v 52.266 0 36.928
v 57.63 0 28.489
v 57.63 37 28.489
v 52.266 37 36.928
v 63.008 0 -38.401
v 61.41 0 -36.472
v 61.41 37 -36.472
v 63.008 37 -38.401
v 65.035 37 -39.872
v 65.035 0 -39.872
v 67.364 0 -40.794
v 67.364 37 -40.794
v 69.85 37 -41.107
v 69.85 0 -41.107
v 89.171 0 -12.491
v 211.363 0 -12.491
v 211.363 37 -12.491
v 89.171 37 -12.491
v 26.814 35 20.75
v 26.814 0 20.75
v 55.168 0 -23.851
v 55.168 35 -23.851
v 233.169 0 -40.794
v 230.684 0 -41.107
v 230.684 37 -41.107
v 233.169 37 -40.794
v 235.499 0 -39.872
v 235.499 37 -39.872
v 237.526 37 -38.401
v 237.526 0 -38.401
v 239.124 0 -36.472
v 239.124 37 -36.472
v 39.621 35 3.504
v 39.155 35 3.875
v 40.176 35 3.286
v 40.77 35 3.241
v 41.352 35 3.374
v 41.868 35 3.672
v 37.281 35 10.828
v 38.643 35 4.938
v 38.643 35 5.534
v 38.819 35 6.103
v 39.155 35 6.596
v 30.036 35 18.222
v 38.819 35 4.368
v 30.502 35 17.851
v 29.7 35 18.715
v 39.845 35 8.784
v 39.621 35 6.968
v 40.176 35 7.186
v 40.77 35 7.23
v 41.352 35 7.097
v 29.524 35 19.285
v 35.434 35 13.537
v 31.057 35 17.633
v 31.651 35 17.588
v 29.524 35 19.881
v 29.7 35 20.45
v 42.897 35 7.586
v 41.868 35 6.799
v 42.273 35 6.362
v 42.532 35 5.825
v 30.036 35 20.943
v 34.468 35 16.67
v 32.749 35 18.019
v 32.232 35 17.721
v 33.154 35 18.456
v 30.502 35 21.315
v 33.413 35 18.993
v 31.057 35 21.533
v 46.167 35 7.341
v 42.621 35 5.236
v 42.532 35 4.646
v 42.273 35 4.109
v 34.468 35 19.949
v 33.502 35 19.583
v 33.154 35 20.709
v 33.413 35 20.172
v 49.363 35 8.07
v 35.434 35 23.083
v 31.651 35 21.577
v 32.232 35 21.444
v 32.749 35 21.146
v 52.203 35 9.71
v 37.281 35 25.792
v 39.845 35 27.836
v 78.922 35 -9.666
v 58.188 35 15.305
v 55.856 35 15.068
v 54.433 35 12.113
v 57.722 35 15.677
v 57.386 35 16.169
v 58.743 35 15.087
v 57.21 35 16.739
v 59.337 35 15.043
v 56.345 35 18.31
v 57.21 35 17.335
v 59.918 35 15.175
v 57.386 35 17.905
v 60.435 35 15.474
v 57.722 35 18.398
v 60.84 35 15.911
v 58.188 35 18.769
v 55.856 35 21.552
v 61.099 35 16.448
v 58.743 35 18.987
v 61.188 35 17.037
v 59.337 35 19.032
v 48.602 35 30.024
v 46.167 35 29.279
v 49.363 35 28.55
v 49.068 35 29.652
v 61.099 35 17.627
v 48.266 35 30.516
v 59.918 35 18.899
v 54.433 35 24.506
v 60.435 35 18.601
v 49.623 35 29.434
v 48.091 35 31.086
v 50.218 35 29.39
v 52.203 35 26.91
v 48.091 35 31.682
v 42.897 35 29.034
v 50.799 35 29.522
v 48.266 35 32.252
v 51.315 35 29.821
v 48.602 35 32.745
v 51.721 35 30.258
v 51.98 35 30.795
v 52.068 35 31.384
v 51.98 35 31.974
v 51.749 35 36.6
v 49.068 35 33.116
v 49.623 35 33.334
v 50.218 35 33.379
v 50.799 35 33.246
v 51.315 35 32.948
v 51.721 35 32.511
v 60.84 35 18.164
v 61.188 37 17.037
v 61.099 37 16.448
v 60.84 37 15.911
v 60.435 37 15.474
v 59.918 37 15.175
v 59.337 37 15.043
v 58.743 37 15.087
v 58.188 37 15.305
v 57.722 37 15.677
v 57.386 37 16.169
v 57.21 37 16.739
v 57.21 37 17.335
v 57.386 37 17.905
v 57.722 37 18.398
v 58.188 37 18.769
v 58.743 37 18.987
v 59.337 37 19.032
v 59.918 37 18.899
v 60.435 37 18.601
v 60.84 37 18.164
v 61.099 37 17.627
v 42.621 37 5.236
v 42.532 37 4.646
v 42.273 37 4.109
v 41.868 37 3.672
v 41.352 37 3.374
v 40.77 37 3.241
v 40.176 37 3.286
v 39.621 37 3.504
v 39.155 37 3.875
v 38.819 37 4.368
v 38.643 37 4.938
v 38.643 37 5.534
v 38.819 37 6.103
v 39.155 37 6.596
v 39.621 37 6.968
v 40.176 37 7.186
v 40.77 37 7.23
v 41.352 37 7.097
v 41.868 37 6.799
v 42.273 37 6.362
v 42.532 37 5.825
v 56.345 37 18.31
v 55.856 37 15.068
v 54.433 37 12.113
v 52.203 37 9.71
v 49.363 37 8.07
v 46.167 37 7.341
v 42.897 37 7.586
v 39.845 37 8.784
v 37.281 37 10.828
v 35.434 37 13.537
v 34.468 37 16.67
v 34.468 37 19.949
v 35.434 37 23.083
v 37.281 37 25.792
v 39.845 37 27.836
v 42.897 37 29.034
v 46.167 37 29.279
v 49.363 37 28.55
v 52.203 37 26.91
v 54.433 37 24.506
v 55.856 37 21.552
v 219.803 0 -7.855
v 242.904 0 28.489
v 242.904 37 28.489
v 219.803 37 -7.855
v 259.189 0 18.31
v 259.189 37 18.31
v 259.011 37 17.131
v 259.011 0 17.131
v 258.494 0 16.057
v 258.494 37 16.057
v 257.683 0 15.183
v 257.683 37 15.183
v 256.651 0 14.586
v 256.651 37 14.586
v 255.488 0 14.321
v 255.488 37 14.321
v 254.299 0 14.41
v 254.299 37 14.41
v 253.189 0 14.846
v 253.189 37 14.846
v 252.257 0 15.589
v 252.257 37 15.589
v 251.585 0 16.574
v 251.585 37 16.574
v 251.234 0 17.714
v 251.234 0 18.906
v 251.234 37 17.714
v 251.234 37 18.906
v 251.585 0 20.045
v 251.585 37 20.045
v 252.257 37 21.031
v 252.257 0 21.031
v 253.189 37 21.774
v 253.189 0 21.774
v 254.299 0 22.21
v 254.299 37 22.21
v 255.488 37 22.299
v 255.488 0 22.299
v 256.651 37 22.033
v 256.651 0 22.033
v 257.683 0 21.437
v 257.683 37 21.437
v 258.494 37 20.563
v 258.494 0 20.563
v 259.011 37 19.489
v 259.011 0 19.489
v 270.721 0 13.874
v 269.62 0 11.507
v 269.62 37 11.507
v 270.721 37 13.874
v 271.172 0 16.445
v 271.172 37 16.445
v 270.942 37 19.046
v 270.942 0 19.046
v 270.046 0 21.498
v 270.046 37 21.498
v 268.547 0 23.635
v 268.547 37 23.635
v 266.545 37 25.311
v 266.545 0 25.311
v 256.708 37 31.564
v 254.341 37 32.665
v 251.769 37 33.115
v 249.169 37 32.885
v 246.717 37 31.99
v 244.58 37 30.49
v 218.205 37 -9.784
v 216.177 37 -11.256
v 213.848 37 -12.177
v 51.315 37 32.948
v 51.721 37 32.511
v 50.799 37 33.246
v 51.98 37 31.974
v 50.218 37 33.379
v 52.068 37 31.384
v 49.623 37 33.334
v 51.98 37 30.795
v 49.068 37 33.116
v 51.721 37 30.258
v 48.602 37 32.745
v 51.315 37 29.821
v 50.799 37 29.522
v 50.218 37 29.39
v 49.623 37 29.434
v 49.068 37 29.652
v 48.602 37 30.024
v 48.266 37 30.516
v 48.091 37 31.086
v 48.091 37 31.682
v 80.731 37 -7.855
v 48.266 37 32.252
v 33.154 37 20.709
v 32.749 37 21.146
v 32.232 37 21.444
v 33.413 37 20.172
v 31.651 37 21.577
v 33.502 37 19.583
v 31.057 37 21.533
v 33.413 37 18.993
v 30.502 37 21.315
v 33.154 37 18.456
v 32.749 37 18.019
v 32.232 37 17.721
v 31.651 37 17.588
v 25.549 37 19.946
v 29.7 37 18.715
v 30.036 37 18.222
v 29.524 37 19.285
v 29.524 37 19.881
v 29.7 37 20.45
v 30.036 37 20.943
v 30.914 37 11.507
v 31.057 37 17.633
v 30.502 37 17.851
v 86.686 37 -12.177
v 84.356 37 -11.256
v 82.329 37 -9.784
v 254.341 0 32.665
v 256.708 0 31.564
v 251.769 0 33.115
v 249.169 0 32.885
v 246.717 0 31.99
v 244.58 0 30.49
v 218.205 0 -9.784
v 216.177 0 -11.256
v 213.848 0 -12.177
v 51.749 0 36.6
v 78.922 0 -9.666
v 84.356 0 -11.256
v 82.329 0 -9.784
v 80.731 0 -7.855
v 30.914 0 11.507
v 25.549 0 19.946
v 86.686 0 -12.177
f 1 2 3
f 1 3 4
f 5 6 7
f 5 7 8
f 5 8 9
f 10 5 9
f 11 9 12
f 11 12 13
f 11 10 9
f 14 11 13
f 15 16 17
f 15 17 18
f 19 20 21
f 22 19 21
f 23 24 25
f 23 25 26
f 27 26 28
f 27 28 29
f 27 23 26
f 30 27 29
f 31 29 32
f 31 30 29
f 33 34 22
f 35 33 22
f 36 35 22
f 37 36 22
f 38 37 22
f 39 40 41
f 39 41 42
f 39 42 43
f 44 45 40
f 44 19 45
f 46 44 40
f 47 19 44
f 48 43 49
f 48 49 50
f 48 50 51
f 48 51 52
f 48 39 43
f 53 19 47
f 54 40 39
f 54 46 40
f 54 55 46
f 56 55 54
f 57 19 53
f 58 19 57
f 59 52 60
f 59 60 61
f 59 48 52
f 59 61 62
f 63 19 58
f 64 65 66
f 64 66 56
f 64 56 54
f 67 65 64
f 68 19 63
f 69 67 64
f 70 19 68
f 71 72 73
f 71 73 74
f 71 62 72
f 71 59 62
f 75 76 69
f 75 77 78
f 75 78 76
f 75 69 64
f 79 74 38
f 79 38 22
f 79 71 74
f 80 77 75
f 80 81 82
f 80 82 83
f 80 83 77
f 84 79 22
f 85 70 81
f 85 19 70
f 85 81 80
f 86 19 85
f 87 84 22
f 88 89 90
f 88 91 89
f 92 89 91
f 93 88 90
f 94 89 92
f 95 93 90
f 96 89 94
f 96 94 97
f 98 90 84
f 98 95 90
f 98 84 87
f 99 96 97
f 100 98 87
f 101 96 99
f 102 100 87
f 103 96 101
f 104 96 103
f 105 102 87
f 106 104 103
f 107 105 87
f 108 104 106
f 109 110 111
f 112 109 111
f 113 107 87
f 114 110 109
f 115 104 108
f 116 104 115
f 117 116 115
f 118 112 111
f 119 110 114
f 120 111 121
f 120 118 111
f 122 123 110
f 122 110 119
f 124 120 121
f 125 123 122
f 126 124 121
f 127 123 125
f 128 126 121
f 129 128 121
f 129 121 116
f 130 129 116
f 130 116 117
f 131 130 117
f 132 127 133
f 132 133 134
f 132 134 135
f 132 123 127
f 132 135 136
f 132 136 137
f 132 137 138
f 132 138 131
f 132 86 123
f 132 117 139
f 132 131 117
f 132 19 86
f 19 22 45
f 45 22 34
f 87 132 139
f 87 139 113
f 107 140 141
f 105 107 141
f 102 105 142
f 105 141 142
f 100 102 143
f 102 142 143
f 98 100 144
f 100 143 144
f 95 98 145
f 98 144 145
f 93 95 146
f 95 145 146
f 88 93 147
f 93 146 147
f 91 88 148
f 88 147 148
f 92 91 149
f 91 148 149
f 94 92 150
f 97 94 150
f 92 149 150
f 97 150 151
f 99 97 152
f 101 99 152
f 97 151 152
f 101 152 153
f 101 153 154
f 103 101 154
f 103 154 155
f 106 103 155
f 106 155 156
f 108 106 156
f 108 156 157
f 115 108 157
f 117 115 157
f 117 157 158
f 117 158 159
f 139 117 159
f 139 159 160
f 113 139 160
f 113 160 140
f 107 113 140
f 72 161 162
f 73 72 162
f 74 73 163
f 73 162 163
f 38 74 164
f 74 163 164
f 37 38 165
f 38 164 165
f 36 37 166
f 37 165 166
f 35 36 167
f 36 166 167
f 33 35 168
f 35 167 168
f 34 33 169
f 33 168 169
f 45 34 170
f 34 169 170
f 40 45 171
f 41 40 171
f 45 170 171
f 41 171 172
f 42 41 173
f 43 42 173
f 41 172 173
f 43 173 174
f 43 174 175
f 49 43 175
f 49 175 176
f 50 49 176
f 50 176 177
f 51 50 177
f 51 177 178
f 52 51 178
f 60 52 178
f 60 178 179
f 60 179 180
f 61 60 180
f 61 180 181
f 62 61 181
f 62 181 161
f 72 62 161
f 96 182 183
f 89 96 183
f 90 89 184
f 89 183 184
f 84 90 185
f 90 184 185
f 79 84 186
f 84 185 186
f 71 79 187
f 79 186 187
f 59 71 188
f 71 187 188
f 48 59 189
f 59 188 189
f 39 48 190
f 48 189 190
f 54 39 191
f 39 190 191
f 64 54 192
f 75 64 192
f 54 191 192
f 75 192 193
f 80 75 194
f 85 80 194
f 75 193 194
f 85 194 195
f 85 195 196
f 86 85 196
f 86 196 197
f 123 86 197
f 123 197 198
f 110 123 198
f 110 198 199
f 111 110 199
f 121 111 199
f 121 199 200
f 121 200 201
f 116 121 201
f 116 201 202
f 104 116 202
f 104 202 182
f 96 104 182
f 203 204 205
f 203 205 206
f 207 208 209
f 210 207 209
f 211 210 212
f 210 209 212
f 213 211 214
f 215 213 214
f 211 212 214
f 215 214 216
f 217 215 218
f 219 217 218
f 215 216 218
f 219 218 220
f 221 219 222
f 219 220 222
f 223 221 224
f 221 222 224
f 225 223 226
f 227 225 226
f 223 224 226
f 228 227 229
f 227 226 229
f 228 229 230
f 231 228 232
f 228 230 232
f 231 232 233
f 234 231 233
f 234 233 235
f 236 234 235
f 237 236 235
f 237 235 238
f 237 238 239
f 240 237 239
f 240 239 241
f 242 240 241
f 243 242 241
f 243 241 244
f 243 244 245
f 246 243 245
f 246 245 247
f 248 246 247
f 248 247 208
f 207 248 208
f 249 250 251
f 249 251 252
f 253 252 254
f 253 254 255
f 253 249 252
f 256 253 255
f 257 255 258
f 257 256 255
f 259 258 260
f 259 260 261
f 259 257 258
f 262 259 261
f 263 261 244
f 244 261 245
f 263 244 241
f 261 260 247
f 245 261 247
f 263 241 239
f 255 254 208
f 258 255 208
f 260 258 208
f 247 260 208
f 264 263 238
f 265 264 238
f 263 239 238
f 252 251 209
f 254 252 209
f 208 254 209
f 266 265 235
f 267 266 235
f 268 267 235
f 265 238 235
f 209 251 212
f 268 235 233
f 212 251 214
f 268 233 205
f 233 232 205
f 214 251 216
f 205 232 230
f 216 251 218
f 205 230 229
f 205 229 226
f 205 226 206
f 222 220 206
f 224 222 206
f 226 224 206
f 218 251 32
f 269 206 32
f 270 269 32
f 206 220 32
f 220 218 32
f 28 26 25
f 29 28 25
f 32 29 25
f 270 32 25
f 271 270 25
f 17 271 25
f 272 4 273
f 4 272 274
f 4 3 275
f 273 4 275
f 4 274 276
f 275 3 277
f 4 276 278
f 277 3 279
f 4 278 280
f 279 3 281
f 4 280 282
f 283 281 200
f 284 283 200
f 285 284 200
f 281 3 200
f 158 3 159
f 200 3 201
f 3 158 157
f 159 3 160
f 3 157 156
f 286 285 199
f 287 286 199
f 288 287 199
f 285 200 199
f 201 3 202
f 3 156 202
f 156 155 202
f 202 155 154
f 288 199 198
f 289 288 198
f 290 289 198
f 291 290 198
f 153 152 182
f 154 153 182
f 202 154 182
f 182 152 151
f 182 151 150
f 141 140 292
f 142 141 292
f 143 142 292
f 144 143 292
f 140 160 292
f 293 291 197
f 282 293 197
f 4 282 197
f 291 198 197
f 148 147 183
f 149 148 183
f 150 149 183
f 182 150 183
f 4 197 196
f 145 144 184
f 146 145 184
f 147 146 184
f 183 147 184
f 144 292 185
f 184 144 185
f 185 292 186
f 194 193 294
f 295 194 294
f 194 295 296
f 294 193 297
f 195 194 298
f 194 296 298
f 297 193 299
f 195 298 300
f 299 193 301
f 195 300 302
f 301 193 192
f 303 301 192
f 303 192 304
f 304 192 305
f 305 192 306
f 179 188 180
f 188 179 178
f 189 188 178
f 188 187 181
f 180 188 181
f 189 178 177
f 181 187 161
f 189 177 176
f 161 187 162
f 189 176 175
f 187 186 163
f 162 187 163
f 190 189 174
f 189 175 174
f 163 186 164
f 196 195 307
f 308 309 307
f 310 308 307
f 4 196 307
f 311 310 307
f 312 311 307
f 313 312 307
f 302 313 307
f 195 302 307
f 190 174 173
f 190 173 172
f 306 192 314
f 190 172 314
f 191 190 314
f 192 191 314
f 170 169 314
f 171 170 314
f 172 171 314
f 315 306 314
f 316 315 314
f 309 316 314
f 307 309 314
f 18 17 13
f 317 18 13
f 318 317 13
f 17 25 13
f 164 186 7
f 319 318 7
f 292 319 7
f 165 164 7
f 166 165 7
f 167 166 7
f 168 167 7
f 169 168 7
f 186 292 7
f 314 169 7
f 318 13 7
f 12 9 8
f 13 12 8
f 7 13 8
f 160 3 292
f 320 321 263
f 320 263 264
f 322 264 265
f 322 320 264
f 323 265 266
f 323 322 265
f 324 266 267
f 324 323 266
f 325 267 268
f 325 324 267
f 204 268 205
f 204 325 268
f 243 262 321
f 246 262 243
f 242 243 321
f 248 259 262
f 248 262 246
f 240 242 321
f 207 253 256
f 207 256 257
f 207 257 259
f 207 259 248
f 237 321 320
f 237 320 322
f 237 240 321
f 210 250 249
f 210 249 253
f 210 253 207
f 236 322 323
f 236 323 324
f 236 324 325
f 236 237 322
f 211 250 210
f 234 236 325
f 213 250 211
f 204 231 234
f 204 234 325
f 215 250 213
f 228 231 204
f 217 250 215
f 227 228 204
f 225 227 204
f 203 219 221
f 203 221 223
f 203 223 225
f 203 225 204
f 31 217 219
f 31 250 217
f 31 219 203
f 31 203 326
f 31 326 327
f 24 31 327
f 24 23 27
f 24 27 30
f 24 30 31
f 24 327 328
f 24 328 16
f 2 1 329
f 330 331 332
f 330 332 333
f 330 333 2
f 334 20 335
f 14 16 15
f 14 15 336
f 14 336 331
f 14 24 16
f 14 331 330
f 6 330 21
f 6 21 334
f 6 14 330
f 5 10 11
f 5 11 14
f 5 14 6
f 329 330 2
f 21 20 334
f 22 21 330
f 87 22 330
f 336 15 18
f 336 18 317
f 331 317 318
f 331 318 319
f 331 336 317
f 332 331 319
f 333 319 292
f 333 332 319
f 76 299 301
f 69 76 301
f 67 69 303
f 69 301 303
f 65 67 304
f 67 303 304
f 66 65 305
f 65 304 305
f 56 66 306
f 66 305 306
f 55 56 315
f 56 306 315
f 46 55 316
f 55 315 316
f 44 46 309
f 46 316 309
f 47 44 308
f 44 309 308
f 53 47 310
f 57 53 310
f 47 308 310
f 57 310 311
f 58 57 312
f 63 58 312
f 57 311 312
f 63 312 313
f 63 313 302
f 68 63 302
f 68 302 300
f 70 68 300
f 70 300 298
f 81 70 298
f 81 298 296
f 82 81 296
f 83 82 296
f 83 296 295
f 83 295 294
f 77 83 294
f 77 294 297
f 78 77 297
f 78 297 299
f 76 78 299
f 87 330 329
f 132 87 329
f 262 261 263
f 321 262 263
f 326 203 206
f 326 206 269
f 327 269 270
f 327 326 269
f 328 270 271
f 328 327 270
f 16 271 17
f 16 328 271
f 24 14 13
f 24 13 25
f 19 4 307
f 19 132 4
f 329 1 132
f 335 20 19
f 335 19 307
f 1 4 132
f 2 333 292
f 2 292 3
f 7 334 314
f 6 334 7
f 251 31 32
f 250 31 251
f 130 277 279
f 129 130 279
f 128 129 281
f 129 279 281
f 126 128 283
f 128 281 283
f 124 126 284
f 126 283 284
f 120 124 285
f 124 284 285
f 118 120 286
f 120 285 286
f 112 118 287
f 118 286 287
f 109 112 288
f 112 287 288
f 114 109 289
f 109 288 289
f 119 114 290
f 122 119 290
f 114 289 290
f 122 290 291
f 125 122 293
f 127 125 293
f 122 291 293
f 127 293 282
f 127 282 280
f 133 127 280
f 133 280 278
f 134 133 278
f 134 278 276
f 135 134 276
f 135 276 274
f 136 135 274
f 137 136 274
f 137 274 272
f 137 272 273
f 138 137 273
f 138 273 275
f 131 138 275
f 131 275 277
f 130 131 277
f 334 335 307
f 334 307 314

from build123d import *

# Parameters (mm, degrees)
BOSS_EXTRUDE1_DEPTH = 37
SKETCH3_R           = 11
SKETCH3_R_2         = 2
SKETCH3_R_3         = 4
CUT_EXTRUDE1_DEPTH  = 92
CUT_EXTRUDE5_DEPTH  = 35


with BuildPart() as part:
    # Sketch1 → Boss-Extrude1 (new body)
    with BuildSketch(Plane(origin=(0, 0, 0), x_dir=(1, 0, 0), z_dir=(0, 1, 0))):
        with BuildLine():
            Line((30.91362152, -11.506988518), (61.410209359, 36.471719739))
            ThreePointArc((61.410209359, 36.471719739), (65.035248289, 39.872184028), (69.84963689, 41.10738726))
            Line((69.84963689, 41.10738726), (230.684249594, 41.10738726))
            ThreePointArc((230.684249594, 41.10738726), (235.498638195, 39.872184028), (239.123677125, 36.471719739))
            Line((239.123677125, 36.471719739), (269.620264964, -11.506988518))
            ThreePointArc((269.620264964, -11.506988518), (270.941569742, -19.045741561), (266.545169913, -25.310748528))
            Line((266.545169913, -25.310748528), (256.707586966, -31.563787081))
            ThreePointArc((256.707586966, -31.563787081), (249.168833923, -32.885091859), (242.903826956, -28.488692029))
            Line((242.903826956, -28.488692029), (219.802518103, 7.855405338))
            ThreePointArc((219.802518103, 7.855405338), (216.177479173, 11.255869627), (211.363090572, 12.491072858))
            Line((211.363090572, 12.491072858), (89.170795912, 12.491072858))
            ThreePointArc((89.170795912, 12.491072858), (84.356407311, 11.255869627), (80.731368381, 7.855405338))
            Line((80.731368381, 7.855405338), (57.630059528, -28.488692029))
            Line((57.630059528, -28.488692029), (52.265727049, -36.92811956))
            Line((52.265727049, -36.92811956), (25.54928904, -19.946416049))
            Line((25.54928904, -19.946416049), (30.91362152, -11.506988518))
        make_face()
    extrude(amount=BOSS_EXTRUDE1_DEPTH)

    # Sketch3 → Cut-Extrude1 (cut)
    with BuildSketch(Plane(origin=(0, 37, 0), x_dir=(1, 0, 0), z_dir=(0, 1, 0))):
        with Locations((45.34470702, -18.309954767)):
            Circle(SKETCH3_R)
        with Locations((40.621019343, -5.235675639)):
            Circle(SKETCH3_R_2)
        with Locations((59.187759911, -17.037207093)):
            Circle(SKETCH3_R_2)
        with Locations((255.189179464, -18.309954767)):
            Circle(SKETCH3_R_3)
        with Locations((50.068394696, -31.384233896)):
            Circle(SKETCH3_R_2)
        with Locations((31.501654128, -19.582702442)):
            Circle(SKETCH3_R_2)
    extrude(amount=-CUT_EXTRUDE1_DEPTH, mode=Mode.SUBTRACT)

    # Sketch9 → Cut-Extrude5 (cut)
    with BuildSketch(Plane.XZ):
        Polygon((26.248657405, 21.639699706), (55.167500935, -23.851457954), (78.921967938, -9.666420768), (51.214594578, 37.510608863), align=None)
    extrude(amount=-CUT_EXTRUDE5_DEPTH, mode=Mode.SUBTRACT)


solid = part.part
